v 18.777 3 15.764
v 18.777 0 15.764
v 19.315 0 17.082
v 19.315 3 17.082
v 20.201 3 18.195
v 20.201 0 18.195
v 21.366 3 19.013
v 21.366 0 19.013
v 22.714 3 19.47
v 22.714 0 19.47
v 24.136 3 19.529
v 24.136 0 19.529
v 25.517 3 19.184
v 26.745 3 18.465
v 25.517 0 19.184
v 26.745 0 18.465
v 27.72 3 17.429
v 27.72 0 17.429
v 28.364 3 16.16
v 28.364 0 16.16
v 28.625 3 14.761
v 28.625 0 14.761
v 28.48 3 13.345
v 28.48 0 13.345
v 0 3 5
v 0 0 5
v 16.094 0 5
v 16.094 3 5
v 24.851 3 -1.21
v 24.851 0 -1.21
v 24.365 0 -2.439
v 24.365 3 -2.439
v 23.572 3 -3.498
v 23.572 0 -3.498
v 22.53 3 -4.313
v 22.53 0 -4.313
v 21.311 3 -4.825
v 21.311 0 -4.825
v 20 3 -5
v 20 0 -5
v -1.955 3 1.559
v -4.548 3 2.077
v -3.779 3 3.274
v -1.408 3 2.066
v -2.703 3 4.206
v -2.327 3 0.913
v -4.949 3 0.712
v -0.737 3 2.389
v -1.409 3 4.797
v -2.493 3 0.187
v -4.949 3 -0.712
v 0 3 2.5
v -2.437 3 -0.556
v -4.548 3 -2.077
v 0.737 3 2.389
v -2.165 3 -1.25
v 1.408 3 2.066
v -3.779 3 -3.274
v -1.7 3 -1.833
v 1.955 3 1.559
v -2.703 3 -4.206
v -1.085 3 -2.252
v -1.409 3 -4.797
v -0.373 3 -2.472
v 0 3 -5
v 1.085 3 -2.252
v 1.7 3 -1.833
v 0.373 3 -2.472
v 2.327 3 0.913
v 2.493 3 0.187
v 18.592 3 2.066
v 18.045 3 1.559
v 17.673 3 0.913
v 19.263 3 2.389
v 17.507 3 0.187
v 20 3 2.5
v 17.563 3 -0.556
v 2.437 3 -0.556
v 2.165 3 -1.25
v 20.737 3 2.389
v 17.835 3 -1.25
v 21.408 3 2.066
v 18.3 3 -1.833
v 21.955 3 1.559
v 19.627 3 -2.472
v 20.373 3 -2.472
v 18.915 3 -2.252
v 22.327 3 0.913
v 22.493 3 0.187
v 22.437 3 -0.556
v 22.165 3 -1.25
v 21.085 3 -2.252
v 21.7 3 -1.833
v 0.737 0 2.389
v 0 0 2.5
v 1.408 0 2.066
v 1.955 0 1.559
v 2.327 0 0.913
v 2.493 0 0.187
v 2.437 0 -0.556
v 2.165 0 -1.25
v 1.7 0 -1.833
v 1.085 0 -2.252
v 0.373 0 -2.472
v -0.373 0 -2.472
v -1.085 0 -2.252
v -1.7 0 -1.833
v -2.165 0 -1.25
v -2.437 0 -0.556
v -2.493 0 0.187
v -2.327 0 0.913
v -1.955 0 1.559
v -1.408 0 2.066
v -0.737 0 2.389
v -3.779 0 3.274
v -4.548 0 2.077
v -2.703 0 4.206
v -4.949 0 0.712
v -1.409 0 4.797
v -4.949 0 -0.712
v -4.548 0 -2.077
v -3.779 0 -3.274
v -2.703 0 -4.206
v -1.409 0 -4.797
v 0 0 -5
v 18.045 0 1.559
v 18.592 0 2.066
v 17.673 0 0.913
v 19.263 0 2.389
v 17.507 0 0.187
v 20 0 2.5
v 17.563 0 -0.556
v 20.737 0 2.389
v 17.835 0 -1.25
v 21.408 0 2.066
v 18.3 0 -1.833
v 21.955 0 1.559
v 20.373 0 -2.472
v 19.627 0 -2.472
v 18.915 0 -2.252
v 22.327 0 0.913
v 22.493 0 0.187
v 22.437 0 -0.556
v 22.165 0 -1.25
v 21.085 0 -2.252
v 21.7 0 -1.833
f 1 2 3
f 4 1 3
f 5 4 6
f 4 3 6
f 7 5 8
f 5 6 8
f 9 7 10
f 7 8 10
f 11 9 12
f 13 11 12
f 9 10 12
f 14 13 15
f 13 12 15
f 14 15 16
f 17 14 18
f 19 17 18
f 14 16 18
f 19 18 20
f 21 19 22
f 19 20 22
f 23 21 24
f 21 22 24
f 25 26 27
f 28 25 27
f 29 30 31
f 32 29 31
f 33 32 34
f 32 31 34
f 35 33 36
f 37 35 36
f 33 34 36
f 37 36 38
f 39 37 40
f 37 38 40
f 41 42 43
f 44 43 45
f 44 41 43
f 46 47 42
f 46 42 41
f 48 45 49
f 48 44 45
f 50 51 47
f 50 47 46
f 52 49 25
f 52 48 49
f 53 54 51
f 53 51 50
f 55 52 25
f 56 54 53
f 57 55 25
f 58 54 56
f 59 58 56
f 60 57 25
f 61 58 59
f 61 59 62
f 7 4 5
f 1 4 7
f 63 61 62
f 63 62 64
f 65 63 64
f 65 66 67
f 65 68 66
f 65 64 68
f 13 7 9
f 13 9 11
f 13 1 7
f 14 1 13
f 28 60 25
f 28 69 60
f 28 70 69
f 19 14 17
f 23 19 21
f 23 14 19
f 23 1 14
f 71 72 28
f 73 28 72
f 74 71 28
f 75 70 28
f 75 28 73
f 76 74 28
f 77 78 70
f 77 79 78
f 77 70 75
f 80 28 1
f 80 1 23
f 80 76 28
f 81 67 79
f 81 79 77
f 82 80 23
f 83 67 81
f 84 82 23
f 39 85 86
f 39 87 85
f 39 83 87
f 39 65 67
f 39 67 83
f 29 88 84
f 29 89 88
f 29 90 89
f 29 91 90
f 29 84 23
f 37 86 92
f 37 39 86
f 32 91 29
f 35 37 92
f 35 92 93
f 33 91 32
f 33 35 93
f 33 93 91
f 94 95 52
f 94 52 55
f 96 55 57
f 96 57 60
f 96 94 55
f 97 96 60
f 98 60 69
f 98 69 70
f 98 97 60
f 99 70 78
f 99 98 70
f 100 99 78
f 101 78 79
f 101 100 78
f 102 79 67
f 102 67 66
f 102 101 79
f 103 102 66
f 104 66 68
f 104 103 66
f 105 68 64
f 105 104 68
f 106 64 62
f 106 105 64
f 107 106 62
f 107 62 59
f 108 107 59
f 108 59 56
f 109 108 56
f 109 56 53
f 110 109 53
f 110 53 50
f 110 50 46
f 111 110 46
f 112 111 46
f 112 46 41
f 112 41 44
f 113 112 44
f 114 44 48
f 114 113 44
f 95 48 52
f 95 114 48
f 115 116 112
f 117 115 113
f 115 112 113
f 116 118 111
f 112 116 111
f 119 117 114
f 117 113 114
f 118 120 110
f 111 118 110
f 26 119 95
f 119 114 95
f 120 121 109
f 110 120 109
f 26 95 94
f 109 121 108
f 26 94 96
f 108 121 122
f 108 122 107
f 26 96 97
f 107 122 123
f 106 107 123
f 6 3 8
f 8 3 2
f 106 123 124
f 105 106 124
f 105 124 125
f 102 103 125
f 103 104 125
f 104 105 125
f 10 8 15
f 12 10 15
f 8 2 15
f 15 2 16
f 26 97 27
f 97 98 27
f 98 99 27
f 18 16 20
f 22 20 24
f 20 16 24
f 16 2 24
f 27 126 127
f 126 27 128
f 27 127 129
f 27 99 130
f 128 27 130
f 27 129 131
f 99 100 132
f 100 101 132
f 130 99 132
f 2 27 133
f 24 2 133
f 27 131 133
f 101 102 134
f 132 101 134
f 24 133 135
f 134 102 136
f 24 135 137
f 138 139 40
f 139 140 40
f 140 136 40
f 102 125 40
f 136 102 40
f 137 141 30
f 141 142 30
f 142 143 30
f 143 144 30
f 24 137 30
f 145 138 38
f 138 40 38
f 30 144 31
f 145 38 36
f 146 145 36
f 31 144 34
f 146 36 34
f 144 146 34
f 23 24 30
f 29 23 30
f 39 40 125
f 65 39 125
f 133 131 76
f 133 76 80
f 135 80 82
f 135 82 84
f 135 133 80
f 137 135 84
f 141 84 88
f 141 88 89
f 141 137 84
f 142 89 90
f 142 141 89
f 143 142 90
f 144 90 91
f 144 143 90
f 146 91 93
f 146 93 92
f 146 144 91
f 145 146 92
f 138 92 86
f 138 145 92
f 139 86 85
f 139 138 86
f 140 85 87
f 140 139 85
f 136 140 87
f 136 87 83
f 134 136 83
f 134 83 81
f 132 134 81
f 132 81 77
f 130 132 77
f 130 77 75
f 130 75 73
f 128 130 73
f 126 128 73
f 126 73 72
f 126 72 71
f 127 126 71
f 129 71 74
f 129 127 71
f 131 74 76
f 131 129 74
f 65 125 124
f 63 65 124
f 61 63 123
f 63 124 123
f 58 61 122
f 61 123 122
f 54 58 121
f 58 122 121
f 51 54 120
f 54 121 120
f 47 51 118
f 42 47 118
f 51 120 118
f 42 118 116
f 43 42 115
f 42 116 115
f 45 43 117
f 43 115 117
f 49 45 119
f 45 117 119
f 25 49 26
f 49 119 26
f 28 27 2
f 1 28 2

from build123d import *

# Parameters (mm, degrees)
SKETCH1_R           = 2.5
BOSS_EXTRUDE1_DEPTH = 3


with BuildPart() as part:
    # Sketch1 → Boss-Extrude1 (new body)
    # profile 1 of 3: a face of its own
    with BuildSketch(Plane(origin=(0, 0, 0), x_dir=(1, 0, 0), z_dir=(0, 1, 0))):
        with BuildLine():
            Line((20, 5), (0, 5))
            ThreePointArc((0, 5), (-5, 0), (0, -5))
            Line((0, -5), (16.093571867, -5))
            Line((16.093571867, -5), (15.148521369, -1.209609478))
            ThreePointArc((15.148521369, -1.209609478), (16.059946232, 3.078307377), (20, 5))
        make_face()
        with Locations(Location((0, 0, 0), (0, 0, 270))):
            Circle(SKETCH1_R, mode=Mode.SUBTRACT)
    # profile 2 of 3: a face of its own
    with BuildSketch(Plane(origin=(0, 0, 0), x_dir=(1, 0, 0), z_dir=(0, 1, 0))):
        with BuildLine():
            ThreePointArc((24.851478631, 1.209609478), (23.078307377, 3.940053768), (20, 5))
            ThreePointArc((20, 5), (16.059946232, 3.078307377), (15.148521369, -1.209609478))
            Line((15.148521369, -1.209609478), (16.093571867, -5))
            Line((16.093571867, -5), (20, -5))
            ThreePointArc((20, -5), (23.940053768, -3.078307377), (24.851478631, 1.209609478))
        make_face()
        with Locations(Location((20, 0, 0), (0, 0, 270))):
            Circle(SKETCH1_R, mode=Mode.SUBTRACT)
    # profile 3 of 3: a face of its own
    with BuildSketch(Plane(origin=(0, 0, 0), x_dir=(1, 0, 0), z_dir=(0, 1, 0))):
        with BuildLine():
            Line((28.480307065, -13.344826416), (24.851478631, 1.209609478))
            ThreePointArc((24.851478631, 1.209609478), (23.940053768, -3.078307377), (20, -5))
            Line((20, -5), (16.093571867, -5))
            Line((16.093571867, -5), (18.777349803, -15.764045372))
            ThreePointArc((18.777349803, -15.764045372), (24.838437912, -19.405914526), (28.480307065, -13.344826416))
        make_face()
    extrude(amount=BOSS_EXTRUDE1_DEPTH)


solid = part.part
